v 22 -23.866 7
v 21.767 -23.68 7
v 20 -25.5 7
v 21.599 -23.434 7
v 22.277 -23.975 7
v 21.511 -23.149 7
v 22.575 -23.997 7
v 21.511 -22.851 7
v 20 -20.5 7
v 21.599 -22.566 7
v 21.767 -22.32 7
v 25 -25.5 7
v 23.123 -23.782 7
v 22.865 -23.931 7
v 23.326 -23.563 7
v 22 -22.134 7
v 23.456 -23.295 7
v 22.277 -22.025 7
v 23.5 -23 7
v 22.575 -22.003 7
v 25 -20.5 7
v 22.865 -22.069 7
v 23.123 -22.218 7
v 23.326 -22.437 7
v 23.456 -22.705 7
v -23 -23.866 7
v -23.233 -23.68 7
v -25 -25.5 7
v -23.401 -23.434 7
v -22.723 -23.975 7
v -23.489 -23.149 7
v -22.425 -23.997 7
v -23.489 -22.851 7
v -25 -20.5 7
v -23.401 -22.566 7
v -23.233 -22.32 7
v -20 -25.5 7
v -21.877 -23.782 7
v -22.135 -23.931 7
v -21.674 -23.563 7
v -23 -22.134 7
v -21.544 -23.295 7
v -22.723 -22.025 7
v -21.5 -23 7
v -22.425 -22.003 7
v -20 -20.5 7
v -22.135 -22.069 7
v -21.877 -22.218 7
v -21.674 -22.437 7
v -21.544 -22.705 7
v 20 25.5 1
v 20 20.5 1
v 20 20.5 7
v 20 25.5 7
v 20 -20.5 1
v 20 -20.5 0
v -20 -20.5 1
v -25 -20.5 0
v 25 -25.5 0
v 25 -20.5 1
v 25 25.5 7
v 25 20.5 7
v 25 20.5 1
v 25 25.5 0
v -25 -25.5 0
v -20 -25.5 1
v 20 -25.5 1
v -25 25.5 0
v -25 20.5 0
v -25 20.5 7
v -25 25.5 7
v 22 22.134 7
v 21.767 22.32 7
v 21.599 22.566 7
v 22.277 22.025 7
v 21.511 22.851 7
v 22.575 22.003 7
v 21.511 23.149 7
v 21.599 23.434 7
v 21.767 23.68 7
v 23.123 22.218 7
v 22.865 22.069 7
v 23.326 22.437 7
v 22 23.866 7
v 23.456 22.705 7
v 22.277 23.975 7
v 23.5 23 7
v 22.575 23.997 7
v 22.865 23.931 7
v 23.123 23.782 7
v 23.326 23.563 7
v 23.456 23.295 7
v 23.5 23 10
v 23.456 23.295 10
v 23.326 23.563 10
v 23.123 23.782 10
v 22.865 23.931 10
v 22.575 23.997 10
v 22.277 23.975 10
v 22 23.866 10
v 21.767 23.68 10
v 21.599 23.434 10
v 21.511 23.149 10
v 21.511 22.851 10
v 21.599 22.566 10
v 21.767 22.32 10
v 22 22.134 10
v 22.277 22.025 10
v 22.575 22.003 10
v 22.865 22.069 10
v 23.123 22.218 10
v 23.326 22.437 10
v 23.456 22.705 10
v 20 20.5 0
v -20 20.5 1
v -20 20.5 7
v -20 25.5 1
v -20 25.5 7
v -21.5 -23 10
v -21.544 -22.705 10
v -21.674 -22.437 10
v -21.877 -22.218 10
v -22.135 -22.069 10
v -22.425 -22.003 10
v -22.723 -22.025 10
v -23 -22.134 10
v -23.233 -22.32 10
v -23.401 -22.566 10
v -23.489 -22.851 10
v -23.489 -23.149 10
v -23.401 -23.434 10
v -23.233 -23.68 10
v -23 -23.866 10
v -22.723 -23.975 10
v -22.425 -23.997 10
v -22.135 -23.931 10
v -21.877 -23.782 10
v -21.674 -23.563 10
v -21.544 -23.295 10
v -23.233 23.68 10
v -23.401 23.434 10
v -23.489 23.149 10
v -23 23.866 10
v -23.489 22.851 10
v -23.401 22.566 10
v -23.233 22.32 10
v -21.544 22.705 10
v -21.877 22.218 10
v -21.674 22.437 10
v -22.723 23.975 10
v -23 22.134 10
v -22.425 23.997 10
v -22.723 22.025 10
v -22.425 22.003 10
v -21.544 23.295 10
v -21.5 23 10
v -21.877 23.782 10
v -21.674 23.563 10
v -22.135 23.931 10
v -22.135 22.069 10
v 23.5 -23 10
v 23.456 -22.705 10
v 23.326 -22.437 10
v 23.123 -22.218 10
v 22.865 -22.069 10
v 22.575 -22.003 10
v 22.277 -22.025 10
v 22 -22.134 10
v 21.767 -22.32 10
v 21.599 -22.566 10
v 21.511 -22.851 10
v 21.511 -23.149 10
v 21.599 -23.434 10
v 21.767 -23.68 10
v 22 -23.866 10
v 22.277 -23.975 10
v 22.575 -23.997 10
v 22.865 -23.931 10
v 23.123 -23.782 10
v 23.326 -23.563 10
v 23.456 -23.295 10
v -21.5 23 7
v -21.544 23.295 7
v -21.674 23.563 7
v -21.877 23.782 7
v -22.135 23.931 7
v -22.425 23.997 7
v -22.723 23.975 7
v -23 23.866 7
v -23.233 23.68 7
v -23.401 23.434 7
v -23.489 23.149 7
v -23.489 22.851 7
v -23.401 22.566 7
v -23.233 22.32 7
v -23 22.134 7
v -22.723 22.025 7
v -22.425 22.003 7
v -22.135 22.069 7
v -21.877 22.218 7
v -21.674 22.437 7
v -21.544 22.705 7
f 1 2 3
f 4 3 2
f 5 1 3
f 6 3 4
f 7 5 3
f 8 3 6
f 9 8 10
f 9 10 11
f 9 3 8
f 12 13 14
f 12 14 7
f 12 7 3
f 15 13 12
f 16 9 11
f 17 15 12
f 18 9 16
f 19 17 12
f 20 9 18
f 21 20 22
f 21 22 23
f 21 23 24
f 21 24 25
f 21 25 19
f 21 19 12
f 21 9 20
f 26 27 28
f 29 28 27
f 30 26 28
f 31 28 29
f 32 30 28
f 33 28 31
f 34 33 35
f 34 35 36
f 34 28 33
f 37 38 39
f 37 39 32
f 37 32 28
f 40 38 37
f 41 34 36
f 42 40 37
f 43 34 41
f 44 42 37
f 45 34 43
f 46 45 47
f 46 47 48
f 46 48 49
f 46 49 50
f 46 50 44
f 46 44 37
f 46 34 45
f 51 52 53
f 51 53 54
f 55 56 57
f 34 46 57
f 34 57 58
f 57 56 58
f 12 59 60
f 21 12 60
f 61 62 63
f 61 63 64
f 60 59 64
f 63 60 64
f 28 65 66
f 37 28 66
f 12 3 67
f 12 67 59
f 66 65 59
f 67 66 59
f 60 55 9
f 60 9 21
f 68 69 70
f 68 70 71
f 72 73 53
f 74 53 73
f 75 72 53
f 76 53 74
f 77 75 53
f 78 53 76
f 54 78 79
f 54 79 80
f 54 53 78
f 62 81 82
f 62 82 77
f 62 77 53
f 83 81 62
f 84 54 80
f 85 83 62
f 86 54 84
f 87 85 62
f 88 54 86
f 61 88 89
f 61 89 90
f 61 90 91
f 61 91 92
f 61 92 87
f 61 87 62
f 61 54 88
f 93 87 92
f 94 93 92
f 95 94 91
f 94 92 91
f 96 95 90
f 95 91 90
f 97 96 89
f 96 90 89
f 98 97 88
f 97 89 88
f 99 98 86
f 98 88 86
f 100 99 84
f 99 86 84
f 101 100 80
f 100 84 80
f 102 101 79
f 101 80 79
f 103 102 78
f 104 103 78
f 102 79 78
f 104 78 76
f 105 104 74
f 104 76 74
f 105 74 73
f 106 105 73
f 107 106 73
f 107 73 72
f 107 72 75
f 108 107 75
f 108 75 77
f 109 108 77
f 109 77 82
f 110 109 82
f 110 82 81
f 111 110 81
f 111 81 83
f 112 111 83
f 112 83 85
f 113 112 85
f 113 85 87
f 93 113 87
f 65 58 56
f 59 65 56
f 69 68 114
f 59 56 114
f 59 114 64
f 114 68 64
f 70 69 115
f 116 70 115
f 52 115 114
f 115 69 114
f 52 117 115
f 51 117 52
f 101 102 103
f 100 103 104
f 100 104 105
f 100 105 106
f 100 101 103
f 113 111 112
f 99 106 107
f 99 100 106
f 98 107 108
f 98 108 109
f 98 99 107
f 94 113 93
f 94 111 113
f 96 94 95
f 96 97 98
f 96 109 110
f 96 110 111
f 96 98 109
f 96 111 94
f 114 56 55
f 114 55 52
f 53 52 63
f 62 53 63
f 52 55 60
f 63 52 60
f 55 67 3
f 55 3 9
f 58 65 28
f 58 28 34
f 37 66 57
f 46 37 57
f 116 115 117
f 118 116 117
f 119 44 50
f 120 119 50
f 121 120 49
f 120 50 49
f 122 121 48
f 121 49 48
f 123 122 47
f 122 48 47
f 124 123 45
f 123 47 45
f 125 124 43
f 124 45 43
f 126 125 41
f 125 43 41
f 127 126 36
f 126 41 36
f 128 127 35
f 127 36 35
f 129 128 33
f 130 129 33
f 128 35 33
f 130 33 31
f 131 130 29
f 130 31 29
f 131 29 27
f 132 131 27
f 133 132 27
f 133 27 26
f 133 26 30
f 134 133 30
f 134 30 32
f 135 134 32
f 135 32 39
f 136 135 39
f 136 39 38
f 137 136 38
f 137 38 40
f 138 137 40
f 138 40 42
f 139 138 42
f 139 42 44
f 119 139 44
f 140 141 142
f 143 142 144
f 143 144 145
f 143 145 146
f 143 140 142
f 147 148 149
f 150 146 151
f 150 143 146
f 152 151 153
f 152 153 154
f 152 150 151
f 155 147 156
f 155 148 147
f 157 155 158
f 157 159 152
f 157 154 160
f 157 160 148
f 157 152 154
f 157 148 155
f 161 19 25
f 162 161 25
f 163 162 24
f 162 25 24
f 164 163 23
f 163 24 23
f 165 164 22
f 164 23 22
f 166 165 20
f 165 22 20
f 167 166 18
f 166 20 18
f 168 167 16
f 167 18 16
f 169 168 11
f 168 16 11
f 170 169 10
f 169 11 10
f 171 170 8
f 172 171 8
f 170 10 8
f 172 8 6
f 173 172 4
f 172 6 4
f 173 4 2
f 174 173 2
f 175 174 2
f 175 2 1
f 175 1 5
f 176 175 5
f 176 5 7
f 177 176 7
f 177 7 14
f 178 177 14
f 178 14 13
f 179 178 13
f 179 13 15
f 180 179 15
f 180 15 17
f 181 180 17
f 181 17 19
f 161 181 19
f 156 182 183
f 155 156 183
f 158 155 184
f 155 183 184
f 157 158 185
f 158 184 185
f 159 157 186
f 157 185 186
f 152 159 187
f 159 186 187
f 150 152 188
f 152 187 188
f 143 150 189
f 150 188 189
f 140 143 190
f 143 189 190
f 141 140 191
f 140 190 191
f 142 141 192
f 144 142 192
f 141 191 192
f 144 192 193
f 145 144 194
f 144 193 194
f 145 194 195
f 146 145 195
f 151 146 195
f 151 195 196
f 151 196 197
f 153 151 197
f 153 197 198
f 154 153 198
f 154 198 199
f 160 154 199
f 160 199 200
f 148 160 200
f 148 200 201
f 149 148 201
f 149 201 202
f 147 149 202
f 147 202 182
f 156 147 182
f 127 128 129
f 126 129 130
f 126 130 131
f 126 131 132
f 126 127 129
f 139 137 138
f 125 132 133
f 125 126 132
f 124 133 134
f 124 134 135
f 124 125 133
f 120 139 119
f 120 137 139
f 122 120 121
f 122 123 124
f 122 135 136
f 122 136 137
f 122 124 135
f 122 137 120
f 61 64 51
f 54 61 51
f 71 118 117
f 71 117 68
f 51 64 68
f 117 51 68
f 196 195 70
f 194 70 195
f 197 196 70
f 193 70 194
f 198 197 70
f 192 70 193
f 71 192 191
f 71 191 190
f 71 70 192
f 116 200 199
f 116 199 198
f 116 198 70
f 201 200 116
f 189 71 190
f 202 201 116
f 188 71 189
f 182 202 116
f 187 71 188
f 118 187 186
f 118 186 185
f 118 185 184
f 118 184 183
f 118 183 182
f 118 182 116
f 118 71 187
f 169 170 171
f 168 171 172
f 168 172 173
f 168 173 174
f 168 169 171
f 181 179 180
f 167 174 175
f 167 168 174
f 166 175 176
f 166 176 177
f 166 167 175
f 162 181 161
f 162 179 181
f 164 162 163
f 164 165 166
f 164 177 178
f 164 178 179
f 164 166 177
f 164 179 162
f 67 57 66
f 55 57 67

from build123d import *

# Parameters (mm, degrees)
F0_W     = 40
F0_H     = 5
F0_W_2   = 5
F0_R     = 1
F0_H_2   = 41
F1_DEPTH = 1
F2_DEPTH = 7
F3_DEPTH = 10


with BuildPart() as f1:
    # F0 (on Top) → F1 (new body)
    with BuildSketch(Plane.XY):
        with Locations((0, -23)):
            Rectangle(F0_W, F0_H)
        with Locations((0, 23)):
            Rectangle(F0_W, F0_H)
        with Locations((-22.5, 23)):
            Rectangle(F0_W_2, F0_H)
        with Locations((-22.5, 23)):
            Circle(F0_R, mode=Mode.SUBTRACT)
        with Locations((22.5, 23)):
            Rectangle(F0_W_2, F0_H)
        with Locations((22.5, 23)):
            Circle(F0_R, mode=Mode.SUBTRACT)
        with Locations((22.5, -23)):
            Rectangle(F0_W_2, F0_H)
        with Locations((22.5, -23)):
            Circle(F0_R, mode=Mode.SUBTRACT)
        with Locations((-22.5, -23)):
            Rectangle(F0_W_2, F0_H)
        with Locations((-22.5, -23)):
            Circle(F0_R, mode=Mode.SUBTRACT)
        with Locations((22.5, 0)):
            Rectangle(F0_W_2, F0_H_2)
        with Locations((-22.5, 23)):
            Circle(F0_R)
        with Locations((22.5, 23)):
            Circle(F0_R)
        with Locations((22.5, -23)):
            Circle(F0_R)
        with Locations((-22.5, -23)):
            Circle(F0_R)
    extrude(amount=F1_DEPTH)

    # F0 (on Top) → F2 (join)
    with BuildSketch(Plane.XY):
        with Locations((22.5, 23)):
            Rectangle(F0_W_2, F0_H)
        with Locations((22.5, 23)):
            Circle(F0_R, mode=Mode.SUBTRACT)
        with Locations((22.5, 23)):
            Circle(F0_R)
        with Locations((-22.5, 23)):
            Rectangle(F0_W_2, F0_H)
        with Locations((-22.5, 23)):
            Circle(F0_R, mode=Mode.SUBTRACT)
        with Locations((-22.5, 23)):
            Circle(F0_R)
        with Locations((22.5, -23)):
            Rectangle(F0_W_2, F0_H)
        with Locations((22.5, -23)):
            Circle(F0_R, mode=Mode.SUBTRACT)
        with Locations((22.5, -23)):
            Circle(F0_R)
        with Locations((-22.5, -23)):
            Rectangle(F0_W_2, F0_H)
        with Locations((-22.5, -23)):
            Circle(F0_R, mode=Mode.SUBTRACT)
        with Locations((-22.5, -23)):
            Circle(F0_R)
    extrude(amount=F2_DEPTH)

    # F0 (on Top) → F3 (join)
    with BuildSketch(Plane.XY):
        with Locations((22.5, 23)):
            Circle(F0_R)
        with Locations((-22.5, 23)):
            Circle(F0_R)
        with Locations((-22.5, -23)):
            Circle(F0_R)
        with Locations((22.5, -23)):
            Circle(F0_R)
    extrude(amount=F3_DEPTH)


solid = f1.part
